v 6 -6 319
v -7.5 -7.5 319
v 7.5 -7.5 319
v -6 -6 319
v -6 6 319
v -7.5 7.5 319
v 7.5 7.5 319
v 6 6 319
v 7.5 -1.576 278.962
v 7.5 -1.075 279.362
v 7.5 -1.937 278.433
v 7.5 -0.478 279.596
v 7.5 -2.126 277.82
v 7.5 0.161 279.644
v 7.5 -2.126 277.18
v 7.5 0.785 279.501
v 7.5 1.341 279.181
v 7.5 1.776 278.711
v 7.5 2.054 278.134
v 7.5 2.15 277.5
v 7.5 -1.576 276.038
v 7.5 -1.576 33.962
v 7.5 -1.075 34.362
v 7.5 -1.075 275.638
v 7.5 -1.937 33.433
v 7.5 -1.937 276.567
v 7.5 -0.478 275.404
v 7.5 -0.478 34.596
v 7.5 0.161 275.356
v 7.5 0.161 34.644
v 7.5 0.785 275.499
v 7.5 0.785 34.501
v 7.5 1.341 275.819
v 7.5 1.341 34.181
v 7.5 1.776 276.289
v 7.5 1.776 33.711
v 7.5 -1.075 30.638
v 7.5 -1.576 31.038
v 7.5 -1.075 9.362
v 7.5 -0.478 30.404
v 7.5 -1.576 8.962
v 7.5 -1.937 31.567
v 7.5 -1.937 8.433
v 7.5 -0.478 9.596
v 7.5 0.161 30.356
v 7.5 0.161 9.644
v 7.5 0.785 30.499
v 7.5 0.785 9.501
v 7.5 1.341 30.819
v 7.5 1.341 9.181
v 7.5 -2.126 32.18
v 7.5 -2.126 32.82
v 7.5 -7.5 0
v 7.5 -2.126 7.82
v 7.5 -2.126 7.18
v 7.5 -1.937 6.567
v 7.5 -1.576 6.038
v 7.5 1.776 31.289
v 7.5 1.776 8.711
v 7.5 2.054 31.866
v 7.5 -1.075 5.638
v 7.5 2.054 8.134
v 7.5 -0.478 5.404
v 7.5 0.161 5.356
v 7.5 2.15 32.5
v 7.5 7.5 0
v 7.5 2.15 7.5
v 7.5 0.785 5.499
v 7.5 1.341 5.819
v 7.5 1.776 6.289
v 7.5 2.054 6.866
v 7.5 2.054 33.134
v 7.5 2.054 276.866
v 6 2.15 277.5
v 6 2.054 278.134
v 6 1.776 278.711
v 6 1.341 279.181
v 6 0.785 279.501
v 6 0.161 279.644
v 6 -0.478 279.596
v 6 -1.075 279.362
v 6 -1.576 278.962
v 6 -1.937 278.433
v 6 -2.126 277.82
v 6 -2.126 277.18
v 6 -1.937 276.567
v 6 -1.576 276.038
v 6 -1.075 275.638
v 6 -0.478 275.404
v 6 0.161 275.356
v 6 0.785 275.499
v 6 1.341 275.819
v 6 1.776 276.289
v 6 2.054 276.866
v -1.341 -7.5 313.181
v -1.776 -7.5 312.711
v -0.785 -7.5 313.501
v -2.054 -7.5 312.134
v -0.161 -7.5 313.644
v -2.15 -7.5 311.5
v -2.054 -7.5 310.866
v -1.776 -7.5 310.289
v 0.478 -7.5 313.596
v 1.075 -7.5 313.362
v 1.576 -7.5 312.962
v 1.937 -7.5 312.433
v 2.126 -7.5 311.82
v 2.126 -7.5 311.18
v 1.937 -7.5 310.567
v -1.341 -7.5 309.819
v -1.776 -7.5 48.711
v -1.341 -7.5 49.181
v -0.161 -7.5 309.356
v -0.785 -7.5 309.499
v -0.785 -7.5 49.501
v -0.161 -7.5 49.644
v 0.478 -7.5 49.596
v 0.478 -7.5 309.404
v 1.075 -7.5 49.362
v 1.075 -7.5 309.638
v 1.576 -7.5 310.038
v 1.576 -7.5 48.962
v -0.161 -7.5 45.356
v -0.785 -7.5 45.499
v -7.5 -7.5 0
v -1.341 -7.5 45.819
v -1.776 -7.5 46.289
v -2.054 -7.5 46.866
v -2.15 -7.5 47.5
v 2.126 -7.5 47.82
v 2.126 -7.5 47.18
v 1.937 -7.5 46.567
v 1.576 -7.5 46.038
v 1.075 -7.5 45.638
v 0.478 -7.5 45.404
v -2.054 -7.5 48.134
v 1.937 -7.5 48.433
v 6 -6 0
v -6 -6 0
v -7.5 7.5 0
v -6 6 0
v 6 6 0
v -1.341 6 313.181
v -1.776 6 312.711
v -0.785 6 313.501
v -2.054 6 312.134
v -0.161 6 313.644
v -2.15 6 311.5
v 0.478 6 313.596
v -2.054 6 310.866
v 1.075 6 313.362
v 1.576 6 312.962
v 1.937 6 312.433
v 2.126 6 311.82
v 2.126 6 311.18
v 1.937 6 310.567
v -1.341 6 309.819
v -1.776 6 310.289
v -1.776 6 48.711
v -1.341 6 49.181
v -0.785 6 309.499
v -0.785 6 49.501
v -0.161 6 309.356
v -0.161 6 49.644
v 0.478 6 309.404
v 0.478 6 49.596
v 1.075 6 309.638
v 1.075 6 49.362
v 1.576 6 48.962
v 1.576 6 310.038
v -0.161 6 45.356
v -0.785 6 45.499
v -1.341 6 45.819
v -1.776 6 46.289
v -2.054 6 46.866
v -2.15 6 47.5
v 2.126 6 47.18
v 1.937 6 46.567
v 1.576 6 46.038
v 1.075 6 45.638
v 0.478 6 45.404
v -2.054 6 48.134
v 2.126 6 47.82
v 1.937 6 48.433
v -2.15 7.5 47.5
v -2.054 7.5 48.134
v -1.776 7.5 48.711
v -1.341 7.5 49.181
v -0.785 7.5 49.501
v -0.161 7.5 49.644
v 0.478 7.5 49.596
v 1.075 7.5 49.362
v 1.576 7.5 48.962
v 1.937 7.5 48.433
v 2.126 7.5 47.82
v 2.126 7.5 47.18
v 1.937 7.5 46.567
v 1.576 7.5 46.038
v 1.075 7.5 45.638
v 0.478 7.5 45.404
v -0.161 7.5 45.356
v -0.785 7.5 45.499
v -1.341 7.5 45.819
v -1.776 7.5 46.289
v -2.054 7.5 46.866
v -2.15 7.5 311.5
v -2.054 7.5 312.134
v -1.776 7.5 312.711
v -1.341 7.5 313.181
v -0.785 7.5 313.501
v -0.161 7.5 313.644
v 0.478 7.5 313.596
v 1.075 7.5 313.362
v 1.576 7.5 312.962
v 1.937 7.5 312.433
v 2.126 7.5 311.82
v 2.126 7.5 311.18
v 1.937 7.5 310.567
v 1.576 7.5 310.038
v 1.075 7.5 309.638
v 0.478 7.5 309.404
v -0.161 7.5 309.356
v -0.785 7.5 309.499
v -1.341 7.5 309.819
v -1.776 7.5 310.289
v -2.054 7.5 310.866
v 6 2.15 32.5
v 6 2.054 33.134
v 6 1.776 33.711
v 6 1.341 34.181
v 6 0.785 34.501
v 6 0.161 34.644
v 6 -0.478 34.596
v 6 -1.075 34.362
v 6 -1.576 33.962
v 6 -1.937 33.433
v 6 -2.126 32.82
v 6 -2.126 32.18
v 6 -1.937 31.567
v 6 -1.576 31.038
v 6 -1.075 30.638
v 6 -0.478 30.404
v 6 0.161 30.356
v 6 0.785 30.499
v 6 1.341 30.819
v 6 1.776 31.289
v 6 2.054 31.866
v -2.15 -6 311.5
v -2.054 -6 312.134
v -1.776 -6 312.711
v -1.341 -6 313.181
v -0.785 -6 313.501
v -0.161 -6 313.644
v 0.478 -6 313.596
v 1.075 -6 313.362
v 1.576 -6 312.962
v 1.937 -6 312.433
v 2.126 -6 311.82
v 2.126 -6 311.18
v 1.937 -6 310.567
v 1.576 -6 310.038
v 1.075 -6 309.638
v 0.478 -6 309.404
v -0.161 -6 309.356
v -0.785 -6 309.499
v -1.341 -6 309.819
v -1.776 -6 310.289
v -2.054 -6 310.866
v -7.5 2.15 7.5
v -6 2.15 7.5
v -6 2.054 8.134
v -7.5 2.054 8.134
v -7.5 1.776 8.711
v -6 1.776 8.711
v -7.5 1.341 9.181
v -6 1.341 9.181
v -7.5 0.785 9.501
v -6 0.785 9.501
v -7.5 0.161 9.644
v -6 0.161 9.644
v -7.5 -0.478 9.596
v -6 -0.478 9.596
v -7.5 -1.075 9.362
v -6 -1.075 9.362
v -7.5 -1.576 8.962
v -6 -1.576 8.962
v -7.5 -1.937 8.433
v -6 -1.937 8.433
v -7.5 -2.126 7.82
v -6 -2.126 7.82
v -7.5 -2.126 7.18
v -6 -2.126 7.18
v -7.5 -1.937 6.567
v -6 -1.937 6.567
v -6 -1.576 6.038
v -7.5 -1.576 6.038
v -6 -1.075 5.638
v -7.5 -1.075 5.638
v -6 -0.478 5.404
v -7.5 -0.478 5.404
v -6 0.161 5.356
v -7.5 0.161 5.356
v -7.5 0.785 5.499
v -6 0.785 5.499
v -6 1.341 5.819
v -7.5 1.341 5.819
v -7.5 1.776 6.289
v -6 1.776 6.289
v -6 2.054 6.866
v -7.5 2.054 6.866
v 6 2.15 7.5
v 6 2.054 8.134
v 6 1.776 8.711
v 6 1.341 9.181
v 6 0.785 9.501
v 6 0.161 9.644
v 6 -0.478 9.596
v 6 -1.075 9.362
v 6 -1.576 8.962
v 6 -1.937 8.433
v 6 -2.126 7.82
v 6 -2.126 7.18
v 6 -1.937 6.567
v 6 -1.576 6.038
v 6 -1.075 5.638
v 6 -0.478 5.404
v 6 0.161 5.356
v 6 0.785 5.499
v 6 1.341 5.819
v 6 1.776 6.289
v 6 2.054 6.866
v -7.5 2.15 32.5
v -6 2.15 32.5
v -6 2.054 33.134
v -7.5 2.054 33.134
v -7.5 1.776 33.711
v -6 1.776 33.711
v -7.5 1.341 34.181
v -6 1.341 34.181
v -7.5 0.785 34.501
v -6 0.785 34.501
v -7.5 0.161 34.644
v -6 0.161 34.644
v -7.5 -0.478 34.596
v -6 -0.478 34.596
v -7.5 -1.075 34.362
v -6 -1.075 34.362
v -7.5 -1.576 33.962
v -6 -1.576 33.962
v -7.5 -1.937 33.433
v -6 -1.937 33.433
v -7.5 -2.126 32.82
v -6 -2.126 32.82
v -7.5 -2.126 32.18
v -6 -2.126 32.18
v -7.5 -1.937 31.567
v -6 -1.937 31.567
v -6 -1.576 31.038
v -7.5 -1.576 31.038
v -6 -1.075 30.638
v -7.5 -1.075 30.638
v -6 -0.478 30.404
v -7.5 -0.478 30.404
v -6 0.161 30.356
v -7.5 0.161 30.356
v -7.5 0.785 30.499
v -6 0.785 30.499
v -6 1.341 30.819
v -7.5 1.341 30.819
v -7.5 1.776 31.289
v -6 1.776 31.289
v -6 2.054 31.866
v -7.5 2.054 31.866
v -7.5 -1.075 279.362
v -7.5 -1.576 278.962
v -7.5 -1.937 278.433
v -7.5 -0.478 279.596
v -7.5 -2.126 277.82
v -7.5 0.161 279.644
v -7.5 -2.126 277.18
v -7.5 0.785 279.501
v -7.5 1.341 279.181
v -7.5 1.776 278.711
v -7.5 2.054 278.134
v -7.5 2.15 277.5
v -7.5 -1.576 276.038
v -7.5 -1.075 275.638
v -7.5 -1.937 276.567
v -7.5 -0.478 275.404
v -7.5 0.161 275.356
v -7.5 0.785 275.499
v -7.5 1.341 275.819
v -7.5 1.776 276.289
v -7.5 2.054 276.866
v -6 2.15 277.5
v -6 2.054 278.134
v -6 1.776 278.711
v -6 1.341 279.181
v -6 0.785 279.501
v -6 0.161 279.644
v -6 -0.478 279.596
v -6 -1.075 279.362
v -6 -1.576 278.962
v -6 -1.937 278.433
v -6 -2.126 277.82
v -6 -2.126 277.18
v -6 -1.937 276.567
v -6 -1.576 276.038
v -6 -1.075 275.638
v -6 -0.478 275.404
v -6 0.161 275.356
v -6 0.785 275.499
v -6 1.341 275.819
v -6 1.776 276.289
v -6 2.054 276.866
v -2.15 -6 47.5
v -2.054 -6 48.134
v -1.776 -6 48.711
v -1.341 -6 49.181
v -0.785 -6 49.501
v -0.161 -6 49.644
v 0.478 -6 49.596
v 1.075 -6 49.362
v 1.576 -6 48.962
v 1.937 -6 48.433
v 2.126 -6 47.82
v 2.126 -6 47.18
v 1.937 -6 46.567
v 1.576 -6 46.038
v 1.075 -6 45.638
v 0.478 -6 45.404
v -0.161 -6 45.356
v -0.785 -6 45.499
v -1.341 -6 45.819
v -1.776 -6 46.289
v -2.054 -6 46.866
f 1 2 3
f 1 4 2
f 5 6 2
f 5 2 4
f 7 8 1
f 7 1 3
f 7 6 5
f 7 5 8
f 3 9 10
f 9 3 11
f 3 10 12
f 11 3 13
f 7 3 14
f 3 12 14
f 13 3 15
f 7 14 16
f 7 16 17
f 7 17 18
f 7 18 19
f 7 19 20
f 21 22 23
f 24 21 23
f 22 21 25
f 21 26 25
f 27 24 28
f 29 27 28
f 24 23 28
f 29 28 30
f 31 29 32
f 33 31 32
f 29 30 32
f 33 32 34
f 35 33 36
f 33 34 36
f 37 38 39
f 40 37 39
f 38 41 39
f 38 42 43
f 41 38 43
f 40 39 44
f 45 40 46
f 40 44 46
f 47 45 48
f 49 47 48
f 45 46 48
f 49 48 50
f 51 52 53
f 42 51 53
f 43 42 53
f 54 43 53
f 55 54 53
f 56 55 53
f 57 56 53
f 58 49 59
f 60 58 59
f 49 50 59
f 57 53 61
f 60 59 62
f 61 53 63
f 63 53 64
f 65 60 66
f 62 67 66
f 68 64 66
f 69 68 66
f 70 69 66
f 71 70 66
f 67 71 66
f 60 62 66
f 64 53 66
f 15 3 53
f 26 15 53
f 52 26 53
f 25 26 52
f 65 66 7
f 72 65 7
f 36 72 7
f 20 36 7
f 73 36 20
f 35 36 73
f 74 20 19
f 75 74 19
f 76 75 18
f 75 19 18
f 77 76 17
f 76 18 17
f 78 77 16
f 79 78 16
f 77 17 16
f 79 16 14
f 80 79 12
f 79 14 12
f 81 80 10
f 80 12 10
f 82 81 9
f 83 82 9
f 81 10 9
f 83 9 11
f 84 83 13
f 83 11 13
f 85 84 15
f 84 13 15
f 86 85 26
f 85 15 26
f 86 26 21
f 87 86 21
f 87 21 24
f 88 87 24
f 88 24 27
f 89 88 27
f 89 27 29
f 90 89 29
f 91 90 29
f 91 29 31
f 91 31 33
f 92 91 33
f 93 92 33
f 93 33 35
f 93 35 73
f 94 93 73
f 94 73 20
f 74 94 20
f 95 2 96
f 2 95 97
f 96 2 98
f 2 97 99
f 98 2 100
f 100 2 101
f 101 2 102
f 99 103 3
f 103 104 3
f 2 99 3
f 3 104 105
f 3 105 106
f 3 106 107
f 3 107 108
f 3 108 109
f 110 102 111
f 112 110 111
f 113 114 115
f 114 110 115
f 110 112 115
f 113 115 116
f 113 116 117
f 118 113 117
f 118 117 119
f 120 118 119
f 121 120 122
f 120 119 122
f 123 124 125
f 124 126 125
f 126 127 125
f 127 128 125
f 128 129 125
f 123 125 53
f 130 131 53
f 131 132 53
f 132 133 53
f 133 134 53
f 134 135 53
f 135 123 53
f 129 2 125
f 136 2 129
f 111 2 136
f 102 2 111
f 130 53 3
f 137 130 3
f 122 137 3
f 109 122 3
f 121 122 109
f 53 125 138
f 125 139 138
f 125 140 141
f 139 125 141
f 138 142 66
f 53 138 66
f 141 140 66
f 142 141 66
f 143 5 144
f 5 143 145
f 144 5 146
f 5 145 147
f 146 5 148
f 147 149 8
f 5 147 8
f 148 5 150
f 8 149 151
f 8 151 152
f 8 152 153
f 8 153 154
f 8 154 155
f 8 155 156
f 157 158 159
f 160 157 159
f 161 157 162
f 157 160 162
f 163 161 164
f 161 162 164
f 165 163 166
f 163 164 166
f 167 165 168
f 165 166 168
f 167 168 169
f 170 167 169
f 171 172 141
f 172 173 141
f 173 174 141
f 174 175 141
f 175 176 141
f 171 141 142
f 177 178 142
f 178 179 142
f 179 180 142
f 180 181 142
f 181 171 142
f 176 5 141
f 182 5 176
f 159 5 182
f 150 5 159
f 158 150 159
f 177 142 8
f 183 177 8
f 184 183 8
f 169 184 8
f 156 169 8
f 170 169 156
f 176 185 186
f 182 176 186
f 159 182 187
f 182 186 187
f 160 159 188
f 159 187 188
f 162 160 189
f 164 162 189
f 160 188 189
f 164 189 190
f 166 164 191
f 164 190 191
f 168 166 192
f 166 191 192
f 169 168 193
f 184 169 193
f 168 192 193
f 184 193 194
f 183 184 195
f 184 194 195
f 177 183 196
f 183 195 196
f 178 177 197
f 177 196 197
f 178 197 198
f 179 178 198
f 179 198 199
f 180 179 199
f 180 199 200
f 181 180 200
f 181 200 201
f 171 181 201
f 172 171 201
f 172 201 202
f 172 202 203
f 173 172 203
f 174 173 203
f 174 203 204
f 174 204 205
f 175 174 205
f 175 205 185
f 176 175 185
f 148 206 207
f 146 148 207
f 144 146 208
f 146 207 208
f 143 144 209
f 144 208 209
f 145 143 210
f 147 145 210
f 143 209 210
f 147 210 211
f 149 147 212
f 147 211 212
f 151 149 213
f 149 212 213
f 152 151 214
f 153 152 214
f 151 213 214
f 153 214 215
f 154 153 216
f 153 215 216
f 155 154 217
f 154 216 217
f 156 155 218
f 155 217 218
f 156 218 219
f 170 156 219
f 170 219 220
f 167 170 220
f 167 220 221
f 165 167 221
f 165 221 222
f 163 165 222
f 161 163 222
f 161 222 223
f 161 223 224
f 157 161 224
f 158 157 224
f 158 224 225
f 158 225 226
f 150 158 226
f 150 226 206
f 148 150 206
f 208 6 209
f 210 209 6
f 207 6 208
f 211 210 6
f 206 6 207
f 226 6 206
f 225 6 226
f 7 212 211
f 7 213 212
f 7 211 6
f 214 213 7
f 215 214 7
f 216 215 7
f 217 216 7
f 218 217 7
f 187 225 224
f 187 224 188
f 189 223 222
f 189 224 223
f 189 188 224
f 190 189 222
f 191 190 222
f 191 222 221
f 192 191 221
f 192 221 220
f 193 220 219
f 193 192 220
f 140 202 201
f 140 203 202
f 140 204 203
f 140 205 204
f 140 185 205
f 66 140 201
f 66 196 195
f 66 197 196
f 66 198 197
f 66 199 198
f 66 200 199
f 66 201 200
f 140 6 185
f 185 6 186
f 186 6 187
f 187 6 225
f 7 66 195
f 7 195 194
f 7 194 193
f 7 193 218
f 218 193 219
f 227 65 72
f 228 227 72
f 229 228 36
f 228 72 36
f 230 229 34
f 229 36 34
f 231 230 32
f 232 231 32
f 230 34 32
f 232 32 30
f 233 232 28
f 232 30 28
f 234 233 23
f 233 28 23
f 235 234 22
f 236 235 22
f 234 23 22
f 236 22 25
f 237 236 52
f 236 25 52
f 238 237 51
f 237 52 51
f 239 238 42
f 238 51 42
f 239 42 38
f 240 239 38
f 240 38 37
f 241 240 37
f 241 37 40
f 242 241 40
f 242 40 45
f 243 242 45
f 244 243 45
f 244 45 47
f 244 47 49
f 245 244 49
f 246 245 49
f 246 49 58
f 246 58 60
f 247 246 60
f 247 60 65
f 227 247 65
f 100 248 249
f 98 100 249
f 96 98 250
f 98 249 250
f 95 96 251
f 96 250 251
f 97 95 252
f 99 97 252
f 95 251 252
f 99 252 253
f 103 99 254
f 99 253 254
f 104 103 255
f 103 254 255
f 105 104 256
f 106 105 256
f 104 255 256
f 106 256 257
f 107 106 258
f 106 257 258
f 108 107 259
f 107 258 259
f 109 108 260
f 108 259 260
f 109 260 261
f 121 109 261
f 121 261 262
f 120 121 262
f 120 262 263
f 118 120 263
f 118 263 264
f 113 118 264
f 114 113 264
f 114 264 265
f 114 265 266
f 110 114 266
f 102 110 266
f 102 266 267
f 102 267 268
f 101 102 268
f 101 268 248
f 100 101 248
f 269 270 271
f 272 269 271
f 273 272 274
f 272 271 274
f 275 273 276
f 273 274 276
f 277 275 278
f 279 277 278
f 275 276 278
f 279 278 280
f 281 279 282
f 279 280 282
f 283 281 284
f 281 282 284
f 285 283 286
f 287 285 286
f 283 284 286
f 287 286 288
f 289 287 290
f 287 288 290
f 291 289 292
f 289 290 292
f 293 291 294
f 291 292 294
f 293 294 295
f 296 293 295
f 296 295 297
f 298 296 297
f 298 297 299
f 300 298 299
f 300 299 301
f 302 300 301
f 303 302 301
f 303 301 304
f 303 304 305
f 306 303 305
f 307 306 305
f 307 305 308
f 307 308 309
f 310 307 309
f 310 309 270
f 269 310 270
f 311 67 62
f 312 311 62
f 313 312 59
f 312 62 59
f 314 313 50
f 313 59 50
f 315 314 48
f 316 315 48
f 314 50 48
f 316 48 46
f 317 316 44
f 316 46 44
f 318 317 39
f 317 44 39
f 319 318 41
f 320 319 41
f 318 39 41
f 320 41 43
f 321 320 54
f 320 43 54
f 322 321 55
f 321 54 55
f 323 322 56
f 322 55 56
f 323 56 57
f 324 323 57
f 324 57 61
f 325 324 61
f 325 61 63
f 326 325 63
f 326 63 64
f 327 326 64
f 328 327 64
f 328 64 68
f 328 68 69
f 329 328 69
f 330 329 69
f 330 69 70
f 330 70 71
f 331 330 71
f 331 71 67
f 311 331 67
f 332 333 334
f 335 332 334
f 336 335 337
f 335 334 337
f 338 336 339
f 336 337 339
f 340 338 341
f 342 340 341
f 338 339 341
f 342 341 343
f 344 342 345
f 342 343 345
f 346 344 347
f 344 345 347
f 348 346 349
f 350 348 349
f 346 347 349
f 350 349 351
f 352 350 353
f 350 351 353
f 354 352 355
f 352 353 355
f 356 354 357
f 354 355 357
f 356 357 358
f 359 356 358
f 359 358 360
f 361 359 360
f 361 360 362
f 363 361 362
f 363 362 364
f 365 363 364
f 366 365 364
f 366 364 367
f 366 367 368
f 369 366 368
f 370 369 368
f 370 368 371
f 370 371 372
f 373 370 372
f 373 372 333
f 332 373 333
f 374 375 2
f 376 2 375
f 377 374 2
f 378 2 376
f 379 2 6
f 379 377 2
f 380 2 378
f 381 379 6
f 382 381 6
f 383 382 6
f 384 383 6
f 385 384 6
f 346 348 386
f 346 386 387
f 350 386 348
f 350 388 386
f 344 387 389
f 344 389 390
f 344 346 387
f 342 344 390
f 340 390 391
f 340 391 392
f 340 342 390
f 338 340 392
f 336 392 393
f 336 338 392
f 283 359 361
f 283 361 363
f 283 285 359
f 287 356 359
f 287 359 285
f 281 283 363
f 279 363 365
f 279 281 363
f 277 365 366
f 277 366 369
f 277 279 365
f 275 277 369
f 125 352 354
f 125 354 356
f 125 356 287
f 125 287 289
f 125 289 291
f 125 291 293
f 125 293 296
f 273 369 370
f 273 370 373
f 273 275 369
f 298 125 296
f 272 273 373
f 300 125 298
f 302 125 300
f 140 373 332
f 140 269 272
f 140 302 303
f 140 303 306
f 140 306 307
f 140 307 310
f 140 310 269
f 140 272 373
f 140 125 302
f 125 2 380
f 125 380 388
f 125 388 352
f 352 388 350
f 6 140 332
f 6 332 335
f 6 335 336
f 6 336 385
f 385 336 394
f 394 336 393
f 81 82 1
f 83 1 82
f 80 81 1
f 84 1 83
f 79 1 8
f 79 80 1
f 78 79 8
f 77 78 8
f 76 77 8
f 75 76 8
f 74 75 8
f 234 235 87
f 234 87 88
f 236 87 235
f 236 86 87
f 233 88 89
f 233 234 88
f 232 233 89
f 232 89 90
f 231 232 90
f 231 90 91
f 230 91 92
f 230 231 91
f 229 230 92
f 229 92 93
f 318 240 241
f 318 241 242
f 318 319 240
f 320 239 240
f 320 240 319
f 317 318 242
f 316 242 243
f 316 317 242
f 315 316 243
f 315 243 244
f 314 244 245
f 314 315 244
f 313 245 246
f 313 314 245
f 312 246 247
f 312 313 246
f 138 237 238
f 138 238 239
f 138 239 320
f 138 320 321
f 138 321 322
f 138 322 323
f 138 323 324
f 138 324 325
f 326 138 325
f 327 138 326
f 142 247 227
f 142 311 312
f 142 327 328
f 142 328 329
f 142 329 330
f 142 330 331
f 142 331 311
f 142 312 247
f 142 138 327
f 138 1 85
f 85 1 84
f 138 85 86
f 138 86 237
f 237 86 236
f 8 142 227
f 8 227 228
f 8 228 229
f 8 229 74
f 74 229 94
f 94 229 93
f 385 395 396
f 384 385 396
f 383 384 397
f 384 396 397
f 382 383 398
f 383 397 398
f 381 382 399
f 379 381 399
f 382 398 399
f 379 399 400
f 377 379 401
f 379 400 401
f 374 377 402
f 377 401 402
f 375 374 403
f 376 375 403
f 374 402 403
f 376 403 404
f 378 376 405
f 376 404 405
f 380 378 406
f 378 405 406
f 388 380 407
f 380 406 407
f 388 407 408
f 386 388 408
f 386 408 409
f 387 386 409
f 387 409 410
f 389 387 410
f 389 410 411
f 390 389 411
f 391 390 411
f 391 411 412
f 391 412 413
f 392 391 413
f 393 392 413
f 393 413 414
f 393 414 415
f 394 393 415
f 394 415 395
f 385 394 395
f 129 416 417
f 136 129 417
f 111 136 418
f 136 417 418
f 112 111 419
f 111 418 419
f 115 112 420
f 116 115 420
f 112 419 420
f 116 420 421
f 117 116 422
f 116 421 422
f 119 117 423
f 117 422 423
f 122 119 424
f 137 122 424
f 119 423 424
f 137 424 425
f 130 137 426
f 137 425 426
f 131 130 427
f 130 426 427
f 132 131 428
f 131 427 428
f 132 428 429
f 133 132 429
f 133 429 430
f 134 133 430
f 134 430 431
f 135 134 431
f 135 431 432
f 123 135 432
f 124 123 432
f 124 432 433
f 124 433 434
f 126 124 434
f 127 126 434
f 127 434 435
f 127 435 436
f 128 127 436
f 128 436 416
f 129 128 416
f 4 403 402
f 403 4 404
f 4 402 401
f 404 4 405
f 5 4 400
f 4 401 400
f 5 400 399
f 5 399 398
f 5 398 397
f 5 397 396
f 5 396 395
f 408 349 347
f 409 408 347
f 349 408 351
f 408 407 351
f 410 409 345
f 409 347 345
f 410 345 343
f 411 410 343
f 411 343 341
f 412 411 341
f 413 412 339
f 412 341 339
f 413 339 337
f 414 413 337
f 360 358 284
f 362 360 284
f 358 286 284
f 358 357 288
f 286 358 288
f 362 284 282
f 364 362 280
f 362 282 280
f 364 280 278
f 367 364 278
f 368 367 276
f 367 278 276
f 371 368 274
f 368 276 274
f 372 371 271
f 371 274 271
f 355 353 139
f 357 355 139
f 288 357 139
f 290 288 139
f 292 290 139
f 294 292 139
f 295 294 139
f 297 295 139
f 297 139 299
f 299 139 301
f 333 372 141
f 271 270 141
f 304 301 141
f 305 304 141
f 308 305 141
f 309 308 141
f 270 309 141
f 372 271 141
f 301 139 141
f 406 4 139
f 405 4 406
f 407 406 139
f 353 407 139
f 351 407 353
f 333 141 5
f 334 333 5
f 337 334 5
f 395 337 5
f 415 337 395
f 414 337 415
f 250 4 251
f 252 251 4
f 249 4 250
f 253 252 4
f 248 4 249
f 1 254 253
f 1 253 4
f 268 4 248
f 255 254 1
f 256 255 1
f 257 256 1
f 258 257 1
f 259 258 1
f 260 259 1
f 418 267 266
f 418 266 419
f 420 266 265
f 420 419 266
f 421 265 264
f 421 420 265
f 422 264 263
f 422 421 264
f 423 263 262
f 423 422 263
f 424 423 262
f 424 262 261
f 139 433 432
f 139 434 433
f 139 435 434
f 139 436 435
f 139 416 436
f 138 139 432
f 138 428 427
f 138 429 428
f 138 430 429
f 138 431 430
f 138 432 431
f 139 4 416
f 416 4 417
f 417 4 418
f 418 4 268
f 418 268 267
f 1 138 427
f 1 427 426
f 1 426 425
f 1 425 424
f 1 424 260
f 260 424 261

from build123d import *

# Parameters (mm, degrees)
SKETCH_1_W          = 15
SKETCH_1_H          = 15
SKETCH_1_W_2        = 12
SKETCH_1_H_2        = 12
EXTRUDE_1_DEPTH     = 319
SKETCH_2_R          = 2.15
CUT_EXTRUDE_1_DEPTH = 320.440526546
SKETCH_3_R          = 2.15
CUT_EXTRUDE_2_DEPTH = 320.440526546


with BuildPart() as part:
    # ｽｹｯﾁ1 → 押し出し-薄板1 (new body)
    with BuildSketch(Plane.XY):
        Rectangle(SKETCH_1_W, SKETCH_1_H)
        Rectangle(SKETCH_1_W_2, SKETCH_1_H_2, mode=Mode.SUBTRACT)
    extrude(amount=EXTRUDE_1_DEPTH)

    # ｽｹｯﾁ2 → ｶｯﾄ - 押し出し1 (cut, through all)
    with BuildSketch(Plane(origin=(0, 7.5, 0), x_dir=(1, 0, 0), z_dir=(0, 1, 0))):
        with Locations(Location((0, -47.5, 0), (0, 0, 180))):
            Circle(SKETCH_2_R)
        with Locations(Location((0, -311.5, 0), (0, 0, 180))):
            Circle(SKETCH_2_R)
    extrude(amount=-CUT_EXTRUDE_1_DEPTH, mode=Mode.SUBTRACT)

    # ｽｹｯﾁ3 → ｶｯﾄ - 押し出し2 (cut, through all)
    with BuildSketch(Plane(origin=(7.5, 0, 0), x_dir=(0, 0, -1), z_dir=(1, 0, 0))):
        with Locations(Location((-32.5, 0, 0), (0, 0, 90))):
            Circle(SKETCH_3_R)
        with Locations(Location((-7.5, 0, 0), (0, 0, 90))):
            Circle(SKETCH_3_R)
        with Locations(Location((-277.5, 0, 0), (0, 0, 90))):
            Circle(SKETCH_3_R)
    extrude(amount=-CUT_EXTRUDE_2_DEPTH, mode=Mode.SUBTRACT)


solid = part.part
